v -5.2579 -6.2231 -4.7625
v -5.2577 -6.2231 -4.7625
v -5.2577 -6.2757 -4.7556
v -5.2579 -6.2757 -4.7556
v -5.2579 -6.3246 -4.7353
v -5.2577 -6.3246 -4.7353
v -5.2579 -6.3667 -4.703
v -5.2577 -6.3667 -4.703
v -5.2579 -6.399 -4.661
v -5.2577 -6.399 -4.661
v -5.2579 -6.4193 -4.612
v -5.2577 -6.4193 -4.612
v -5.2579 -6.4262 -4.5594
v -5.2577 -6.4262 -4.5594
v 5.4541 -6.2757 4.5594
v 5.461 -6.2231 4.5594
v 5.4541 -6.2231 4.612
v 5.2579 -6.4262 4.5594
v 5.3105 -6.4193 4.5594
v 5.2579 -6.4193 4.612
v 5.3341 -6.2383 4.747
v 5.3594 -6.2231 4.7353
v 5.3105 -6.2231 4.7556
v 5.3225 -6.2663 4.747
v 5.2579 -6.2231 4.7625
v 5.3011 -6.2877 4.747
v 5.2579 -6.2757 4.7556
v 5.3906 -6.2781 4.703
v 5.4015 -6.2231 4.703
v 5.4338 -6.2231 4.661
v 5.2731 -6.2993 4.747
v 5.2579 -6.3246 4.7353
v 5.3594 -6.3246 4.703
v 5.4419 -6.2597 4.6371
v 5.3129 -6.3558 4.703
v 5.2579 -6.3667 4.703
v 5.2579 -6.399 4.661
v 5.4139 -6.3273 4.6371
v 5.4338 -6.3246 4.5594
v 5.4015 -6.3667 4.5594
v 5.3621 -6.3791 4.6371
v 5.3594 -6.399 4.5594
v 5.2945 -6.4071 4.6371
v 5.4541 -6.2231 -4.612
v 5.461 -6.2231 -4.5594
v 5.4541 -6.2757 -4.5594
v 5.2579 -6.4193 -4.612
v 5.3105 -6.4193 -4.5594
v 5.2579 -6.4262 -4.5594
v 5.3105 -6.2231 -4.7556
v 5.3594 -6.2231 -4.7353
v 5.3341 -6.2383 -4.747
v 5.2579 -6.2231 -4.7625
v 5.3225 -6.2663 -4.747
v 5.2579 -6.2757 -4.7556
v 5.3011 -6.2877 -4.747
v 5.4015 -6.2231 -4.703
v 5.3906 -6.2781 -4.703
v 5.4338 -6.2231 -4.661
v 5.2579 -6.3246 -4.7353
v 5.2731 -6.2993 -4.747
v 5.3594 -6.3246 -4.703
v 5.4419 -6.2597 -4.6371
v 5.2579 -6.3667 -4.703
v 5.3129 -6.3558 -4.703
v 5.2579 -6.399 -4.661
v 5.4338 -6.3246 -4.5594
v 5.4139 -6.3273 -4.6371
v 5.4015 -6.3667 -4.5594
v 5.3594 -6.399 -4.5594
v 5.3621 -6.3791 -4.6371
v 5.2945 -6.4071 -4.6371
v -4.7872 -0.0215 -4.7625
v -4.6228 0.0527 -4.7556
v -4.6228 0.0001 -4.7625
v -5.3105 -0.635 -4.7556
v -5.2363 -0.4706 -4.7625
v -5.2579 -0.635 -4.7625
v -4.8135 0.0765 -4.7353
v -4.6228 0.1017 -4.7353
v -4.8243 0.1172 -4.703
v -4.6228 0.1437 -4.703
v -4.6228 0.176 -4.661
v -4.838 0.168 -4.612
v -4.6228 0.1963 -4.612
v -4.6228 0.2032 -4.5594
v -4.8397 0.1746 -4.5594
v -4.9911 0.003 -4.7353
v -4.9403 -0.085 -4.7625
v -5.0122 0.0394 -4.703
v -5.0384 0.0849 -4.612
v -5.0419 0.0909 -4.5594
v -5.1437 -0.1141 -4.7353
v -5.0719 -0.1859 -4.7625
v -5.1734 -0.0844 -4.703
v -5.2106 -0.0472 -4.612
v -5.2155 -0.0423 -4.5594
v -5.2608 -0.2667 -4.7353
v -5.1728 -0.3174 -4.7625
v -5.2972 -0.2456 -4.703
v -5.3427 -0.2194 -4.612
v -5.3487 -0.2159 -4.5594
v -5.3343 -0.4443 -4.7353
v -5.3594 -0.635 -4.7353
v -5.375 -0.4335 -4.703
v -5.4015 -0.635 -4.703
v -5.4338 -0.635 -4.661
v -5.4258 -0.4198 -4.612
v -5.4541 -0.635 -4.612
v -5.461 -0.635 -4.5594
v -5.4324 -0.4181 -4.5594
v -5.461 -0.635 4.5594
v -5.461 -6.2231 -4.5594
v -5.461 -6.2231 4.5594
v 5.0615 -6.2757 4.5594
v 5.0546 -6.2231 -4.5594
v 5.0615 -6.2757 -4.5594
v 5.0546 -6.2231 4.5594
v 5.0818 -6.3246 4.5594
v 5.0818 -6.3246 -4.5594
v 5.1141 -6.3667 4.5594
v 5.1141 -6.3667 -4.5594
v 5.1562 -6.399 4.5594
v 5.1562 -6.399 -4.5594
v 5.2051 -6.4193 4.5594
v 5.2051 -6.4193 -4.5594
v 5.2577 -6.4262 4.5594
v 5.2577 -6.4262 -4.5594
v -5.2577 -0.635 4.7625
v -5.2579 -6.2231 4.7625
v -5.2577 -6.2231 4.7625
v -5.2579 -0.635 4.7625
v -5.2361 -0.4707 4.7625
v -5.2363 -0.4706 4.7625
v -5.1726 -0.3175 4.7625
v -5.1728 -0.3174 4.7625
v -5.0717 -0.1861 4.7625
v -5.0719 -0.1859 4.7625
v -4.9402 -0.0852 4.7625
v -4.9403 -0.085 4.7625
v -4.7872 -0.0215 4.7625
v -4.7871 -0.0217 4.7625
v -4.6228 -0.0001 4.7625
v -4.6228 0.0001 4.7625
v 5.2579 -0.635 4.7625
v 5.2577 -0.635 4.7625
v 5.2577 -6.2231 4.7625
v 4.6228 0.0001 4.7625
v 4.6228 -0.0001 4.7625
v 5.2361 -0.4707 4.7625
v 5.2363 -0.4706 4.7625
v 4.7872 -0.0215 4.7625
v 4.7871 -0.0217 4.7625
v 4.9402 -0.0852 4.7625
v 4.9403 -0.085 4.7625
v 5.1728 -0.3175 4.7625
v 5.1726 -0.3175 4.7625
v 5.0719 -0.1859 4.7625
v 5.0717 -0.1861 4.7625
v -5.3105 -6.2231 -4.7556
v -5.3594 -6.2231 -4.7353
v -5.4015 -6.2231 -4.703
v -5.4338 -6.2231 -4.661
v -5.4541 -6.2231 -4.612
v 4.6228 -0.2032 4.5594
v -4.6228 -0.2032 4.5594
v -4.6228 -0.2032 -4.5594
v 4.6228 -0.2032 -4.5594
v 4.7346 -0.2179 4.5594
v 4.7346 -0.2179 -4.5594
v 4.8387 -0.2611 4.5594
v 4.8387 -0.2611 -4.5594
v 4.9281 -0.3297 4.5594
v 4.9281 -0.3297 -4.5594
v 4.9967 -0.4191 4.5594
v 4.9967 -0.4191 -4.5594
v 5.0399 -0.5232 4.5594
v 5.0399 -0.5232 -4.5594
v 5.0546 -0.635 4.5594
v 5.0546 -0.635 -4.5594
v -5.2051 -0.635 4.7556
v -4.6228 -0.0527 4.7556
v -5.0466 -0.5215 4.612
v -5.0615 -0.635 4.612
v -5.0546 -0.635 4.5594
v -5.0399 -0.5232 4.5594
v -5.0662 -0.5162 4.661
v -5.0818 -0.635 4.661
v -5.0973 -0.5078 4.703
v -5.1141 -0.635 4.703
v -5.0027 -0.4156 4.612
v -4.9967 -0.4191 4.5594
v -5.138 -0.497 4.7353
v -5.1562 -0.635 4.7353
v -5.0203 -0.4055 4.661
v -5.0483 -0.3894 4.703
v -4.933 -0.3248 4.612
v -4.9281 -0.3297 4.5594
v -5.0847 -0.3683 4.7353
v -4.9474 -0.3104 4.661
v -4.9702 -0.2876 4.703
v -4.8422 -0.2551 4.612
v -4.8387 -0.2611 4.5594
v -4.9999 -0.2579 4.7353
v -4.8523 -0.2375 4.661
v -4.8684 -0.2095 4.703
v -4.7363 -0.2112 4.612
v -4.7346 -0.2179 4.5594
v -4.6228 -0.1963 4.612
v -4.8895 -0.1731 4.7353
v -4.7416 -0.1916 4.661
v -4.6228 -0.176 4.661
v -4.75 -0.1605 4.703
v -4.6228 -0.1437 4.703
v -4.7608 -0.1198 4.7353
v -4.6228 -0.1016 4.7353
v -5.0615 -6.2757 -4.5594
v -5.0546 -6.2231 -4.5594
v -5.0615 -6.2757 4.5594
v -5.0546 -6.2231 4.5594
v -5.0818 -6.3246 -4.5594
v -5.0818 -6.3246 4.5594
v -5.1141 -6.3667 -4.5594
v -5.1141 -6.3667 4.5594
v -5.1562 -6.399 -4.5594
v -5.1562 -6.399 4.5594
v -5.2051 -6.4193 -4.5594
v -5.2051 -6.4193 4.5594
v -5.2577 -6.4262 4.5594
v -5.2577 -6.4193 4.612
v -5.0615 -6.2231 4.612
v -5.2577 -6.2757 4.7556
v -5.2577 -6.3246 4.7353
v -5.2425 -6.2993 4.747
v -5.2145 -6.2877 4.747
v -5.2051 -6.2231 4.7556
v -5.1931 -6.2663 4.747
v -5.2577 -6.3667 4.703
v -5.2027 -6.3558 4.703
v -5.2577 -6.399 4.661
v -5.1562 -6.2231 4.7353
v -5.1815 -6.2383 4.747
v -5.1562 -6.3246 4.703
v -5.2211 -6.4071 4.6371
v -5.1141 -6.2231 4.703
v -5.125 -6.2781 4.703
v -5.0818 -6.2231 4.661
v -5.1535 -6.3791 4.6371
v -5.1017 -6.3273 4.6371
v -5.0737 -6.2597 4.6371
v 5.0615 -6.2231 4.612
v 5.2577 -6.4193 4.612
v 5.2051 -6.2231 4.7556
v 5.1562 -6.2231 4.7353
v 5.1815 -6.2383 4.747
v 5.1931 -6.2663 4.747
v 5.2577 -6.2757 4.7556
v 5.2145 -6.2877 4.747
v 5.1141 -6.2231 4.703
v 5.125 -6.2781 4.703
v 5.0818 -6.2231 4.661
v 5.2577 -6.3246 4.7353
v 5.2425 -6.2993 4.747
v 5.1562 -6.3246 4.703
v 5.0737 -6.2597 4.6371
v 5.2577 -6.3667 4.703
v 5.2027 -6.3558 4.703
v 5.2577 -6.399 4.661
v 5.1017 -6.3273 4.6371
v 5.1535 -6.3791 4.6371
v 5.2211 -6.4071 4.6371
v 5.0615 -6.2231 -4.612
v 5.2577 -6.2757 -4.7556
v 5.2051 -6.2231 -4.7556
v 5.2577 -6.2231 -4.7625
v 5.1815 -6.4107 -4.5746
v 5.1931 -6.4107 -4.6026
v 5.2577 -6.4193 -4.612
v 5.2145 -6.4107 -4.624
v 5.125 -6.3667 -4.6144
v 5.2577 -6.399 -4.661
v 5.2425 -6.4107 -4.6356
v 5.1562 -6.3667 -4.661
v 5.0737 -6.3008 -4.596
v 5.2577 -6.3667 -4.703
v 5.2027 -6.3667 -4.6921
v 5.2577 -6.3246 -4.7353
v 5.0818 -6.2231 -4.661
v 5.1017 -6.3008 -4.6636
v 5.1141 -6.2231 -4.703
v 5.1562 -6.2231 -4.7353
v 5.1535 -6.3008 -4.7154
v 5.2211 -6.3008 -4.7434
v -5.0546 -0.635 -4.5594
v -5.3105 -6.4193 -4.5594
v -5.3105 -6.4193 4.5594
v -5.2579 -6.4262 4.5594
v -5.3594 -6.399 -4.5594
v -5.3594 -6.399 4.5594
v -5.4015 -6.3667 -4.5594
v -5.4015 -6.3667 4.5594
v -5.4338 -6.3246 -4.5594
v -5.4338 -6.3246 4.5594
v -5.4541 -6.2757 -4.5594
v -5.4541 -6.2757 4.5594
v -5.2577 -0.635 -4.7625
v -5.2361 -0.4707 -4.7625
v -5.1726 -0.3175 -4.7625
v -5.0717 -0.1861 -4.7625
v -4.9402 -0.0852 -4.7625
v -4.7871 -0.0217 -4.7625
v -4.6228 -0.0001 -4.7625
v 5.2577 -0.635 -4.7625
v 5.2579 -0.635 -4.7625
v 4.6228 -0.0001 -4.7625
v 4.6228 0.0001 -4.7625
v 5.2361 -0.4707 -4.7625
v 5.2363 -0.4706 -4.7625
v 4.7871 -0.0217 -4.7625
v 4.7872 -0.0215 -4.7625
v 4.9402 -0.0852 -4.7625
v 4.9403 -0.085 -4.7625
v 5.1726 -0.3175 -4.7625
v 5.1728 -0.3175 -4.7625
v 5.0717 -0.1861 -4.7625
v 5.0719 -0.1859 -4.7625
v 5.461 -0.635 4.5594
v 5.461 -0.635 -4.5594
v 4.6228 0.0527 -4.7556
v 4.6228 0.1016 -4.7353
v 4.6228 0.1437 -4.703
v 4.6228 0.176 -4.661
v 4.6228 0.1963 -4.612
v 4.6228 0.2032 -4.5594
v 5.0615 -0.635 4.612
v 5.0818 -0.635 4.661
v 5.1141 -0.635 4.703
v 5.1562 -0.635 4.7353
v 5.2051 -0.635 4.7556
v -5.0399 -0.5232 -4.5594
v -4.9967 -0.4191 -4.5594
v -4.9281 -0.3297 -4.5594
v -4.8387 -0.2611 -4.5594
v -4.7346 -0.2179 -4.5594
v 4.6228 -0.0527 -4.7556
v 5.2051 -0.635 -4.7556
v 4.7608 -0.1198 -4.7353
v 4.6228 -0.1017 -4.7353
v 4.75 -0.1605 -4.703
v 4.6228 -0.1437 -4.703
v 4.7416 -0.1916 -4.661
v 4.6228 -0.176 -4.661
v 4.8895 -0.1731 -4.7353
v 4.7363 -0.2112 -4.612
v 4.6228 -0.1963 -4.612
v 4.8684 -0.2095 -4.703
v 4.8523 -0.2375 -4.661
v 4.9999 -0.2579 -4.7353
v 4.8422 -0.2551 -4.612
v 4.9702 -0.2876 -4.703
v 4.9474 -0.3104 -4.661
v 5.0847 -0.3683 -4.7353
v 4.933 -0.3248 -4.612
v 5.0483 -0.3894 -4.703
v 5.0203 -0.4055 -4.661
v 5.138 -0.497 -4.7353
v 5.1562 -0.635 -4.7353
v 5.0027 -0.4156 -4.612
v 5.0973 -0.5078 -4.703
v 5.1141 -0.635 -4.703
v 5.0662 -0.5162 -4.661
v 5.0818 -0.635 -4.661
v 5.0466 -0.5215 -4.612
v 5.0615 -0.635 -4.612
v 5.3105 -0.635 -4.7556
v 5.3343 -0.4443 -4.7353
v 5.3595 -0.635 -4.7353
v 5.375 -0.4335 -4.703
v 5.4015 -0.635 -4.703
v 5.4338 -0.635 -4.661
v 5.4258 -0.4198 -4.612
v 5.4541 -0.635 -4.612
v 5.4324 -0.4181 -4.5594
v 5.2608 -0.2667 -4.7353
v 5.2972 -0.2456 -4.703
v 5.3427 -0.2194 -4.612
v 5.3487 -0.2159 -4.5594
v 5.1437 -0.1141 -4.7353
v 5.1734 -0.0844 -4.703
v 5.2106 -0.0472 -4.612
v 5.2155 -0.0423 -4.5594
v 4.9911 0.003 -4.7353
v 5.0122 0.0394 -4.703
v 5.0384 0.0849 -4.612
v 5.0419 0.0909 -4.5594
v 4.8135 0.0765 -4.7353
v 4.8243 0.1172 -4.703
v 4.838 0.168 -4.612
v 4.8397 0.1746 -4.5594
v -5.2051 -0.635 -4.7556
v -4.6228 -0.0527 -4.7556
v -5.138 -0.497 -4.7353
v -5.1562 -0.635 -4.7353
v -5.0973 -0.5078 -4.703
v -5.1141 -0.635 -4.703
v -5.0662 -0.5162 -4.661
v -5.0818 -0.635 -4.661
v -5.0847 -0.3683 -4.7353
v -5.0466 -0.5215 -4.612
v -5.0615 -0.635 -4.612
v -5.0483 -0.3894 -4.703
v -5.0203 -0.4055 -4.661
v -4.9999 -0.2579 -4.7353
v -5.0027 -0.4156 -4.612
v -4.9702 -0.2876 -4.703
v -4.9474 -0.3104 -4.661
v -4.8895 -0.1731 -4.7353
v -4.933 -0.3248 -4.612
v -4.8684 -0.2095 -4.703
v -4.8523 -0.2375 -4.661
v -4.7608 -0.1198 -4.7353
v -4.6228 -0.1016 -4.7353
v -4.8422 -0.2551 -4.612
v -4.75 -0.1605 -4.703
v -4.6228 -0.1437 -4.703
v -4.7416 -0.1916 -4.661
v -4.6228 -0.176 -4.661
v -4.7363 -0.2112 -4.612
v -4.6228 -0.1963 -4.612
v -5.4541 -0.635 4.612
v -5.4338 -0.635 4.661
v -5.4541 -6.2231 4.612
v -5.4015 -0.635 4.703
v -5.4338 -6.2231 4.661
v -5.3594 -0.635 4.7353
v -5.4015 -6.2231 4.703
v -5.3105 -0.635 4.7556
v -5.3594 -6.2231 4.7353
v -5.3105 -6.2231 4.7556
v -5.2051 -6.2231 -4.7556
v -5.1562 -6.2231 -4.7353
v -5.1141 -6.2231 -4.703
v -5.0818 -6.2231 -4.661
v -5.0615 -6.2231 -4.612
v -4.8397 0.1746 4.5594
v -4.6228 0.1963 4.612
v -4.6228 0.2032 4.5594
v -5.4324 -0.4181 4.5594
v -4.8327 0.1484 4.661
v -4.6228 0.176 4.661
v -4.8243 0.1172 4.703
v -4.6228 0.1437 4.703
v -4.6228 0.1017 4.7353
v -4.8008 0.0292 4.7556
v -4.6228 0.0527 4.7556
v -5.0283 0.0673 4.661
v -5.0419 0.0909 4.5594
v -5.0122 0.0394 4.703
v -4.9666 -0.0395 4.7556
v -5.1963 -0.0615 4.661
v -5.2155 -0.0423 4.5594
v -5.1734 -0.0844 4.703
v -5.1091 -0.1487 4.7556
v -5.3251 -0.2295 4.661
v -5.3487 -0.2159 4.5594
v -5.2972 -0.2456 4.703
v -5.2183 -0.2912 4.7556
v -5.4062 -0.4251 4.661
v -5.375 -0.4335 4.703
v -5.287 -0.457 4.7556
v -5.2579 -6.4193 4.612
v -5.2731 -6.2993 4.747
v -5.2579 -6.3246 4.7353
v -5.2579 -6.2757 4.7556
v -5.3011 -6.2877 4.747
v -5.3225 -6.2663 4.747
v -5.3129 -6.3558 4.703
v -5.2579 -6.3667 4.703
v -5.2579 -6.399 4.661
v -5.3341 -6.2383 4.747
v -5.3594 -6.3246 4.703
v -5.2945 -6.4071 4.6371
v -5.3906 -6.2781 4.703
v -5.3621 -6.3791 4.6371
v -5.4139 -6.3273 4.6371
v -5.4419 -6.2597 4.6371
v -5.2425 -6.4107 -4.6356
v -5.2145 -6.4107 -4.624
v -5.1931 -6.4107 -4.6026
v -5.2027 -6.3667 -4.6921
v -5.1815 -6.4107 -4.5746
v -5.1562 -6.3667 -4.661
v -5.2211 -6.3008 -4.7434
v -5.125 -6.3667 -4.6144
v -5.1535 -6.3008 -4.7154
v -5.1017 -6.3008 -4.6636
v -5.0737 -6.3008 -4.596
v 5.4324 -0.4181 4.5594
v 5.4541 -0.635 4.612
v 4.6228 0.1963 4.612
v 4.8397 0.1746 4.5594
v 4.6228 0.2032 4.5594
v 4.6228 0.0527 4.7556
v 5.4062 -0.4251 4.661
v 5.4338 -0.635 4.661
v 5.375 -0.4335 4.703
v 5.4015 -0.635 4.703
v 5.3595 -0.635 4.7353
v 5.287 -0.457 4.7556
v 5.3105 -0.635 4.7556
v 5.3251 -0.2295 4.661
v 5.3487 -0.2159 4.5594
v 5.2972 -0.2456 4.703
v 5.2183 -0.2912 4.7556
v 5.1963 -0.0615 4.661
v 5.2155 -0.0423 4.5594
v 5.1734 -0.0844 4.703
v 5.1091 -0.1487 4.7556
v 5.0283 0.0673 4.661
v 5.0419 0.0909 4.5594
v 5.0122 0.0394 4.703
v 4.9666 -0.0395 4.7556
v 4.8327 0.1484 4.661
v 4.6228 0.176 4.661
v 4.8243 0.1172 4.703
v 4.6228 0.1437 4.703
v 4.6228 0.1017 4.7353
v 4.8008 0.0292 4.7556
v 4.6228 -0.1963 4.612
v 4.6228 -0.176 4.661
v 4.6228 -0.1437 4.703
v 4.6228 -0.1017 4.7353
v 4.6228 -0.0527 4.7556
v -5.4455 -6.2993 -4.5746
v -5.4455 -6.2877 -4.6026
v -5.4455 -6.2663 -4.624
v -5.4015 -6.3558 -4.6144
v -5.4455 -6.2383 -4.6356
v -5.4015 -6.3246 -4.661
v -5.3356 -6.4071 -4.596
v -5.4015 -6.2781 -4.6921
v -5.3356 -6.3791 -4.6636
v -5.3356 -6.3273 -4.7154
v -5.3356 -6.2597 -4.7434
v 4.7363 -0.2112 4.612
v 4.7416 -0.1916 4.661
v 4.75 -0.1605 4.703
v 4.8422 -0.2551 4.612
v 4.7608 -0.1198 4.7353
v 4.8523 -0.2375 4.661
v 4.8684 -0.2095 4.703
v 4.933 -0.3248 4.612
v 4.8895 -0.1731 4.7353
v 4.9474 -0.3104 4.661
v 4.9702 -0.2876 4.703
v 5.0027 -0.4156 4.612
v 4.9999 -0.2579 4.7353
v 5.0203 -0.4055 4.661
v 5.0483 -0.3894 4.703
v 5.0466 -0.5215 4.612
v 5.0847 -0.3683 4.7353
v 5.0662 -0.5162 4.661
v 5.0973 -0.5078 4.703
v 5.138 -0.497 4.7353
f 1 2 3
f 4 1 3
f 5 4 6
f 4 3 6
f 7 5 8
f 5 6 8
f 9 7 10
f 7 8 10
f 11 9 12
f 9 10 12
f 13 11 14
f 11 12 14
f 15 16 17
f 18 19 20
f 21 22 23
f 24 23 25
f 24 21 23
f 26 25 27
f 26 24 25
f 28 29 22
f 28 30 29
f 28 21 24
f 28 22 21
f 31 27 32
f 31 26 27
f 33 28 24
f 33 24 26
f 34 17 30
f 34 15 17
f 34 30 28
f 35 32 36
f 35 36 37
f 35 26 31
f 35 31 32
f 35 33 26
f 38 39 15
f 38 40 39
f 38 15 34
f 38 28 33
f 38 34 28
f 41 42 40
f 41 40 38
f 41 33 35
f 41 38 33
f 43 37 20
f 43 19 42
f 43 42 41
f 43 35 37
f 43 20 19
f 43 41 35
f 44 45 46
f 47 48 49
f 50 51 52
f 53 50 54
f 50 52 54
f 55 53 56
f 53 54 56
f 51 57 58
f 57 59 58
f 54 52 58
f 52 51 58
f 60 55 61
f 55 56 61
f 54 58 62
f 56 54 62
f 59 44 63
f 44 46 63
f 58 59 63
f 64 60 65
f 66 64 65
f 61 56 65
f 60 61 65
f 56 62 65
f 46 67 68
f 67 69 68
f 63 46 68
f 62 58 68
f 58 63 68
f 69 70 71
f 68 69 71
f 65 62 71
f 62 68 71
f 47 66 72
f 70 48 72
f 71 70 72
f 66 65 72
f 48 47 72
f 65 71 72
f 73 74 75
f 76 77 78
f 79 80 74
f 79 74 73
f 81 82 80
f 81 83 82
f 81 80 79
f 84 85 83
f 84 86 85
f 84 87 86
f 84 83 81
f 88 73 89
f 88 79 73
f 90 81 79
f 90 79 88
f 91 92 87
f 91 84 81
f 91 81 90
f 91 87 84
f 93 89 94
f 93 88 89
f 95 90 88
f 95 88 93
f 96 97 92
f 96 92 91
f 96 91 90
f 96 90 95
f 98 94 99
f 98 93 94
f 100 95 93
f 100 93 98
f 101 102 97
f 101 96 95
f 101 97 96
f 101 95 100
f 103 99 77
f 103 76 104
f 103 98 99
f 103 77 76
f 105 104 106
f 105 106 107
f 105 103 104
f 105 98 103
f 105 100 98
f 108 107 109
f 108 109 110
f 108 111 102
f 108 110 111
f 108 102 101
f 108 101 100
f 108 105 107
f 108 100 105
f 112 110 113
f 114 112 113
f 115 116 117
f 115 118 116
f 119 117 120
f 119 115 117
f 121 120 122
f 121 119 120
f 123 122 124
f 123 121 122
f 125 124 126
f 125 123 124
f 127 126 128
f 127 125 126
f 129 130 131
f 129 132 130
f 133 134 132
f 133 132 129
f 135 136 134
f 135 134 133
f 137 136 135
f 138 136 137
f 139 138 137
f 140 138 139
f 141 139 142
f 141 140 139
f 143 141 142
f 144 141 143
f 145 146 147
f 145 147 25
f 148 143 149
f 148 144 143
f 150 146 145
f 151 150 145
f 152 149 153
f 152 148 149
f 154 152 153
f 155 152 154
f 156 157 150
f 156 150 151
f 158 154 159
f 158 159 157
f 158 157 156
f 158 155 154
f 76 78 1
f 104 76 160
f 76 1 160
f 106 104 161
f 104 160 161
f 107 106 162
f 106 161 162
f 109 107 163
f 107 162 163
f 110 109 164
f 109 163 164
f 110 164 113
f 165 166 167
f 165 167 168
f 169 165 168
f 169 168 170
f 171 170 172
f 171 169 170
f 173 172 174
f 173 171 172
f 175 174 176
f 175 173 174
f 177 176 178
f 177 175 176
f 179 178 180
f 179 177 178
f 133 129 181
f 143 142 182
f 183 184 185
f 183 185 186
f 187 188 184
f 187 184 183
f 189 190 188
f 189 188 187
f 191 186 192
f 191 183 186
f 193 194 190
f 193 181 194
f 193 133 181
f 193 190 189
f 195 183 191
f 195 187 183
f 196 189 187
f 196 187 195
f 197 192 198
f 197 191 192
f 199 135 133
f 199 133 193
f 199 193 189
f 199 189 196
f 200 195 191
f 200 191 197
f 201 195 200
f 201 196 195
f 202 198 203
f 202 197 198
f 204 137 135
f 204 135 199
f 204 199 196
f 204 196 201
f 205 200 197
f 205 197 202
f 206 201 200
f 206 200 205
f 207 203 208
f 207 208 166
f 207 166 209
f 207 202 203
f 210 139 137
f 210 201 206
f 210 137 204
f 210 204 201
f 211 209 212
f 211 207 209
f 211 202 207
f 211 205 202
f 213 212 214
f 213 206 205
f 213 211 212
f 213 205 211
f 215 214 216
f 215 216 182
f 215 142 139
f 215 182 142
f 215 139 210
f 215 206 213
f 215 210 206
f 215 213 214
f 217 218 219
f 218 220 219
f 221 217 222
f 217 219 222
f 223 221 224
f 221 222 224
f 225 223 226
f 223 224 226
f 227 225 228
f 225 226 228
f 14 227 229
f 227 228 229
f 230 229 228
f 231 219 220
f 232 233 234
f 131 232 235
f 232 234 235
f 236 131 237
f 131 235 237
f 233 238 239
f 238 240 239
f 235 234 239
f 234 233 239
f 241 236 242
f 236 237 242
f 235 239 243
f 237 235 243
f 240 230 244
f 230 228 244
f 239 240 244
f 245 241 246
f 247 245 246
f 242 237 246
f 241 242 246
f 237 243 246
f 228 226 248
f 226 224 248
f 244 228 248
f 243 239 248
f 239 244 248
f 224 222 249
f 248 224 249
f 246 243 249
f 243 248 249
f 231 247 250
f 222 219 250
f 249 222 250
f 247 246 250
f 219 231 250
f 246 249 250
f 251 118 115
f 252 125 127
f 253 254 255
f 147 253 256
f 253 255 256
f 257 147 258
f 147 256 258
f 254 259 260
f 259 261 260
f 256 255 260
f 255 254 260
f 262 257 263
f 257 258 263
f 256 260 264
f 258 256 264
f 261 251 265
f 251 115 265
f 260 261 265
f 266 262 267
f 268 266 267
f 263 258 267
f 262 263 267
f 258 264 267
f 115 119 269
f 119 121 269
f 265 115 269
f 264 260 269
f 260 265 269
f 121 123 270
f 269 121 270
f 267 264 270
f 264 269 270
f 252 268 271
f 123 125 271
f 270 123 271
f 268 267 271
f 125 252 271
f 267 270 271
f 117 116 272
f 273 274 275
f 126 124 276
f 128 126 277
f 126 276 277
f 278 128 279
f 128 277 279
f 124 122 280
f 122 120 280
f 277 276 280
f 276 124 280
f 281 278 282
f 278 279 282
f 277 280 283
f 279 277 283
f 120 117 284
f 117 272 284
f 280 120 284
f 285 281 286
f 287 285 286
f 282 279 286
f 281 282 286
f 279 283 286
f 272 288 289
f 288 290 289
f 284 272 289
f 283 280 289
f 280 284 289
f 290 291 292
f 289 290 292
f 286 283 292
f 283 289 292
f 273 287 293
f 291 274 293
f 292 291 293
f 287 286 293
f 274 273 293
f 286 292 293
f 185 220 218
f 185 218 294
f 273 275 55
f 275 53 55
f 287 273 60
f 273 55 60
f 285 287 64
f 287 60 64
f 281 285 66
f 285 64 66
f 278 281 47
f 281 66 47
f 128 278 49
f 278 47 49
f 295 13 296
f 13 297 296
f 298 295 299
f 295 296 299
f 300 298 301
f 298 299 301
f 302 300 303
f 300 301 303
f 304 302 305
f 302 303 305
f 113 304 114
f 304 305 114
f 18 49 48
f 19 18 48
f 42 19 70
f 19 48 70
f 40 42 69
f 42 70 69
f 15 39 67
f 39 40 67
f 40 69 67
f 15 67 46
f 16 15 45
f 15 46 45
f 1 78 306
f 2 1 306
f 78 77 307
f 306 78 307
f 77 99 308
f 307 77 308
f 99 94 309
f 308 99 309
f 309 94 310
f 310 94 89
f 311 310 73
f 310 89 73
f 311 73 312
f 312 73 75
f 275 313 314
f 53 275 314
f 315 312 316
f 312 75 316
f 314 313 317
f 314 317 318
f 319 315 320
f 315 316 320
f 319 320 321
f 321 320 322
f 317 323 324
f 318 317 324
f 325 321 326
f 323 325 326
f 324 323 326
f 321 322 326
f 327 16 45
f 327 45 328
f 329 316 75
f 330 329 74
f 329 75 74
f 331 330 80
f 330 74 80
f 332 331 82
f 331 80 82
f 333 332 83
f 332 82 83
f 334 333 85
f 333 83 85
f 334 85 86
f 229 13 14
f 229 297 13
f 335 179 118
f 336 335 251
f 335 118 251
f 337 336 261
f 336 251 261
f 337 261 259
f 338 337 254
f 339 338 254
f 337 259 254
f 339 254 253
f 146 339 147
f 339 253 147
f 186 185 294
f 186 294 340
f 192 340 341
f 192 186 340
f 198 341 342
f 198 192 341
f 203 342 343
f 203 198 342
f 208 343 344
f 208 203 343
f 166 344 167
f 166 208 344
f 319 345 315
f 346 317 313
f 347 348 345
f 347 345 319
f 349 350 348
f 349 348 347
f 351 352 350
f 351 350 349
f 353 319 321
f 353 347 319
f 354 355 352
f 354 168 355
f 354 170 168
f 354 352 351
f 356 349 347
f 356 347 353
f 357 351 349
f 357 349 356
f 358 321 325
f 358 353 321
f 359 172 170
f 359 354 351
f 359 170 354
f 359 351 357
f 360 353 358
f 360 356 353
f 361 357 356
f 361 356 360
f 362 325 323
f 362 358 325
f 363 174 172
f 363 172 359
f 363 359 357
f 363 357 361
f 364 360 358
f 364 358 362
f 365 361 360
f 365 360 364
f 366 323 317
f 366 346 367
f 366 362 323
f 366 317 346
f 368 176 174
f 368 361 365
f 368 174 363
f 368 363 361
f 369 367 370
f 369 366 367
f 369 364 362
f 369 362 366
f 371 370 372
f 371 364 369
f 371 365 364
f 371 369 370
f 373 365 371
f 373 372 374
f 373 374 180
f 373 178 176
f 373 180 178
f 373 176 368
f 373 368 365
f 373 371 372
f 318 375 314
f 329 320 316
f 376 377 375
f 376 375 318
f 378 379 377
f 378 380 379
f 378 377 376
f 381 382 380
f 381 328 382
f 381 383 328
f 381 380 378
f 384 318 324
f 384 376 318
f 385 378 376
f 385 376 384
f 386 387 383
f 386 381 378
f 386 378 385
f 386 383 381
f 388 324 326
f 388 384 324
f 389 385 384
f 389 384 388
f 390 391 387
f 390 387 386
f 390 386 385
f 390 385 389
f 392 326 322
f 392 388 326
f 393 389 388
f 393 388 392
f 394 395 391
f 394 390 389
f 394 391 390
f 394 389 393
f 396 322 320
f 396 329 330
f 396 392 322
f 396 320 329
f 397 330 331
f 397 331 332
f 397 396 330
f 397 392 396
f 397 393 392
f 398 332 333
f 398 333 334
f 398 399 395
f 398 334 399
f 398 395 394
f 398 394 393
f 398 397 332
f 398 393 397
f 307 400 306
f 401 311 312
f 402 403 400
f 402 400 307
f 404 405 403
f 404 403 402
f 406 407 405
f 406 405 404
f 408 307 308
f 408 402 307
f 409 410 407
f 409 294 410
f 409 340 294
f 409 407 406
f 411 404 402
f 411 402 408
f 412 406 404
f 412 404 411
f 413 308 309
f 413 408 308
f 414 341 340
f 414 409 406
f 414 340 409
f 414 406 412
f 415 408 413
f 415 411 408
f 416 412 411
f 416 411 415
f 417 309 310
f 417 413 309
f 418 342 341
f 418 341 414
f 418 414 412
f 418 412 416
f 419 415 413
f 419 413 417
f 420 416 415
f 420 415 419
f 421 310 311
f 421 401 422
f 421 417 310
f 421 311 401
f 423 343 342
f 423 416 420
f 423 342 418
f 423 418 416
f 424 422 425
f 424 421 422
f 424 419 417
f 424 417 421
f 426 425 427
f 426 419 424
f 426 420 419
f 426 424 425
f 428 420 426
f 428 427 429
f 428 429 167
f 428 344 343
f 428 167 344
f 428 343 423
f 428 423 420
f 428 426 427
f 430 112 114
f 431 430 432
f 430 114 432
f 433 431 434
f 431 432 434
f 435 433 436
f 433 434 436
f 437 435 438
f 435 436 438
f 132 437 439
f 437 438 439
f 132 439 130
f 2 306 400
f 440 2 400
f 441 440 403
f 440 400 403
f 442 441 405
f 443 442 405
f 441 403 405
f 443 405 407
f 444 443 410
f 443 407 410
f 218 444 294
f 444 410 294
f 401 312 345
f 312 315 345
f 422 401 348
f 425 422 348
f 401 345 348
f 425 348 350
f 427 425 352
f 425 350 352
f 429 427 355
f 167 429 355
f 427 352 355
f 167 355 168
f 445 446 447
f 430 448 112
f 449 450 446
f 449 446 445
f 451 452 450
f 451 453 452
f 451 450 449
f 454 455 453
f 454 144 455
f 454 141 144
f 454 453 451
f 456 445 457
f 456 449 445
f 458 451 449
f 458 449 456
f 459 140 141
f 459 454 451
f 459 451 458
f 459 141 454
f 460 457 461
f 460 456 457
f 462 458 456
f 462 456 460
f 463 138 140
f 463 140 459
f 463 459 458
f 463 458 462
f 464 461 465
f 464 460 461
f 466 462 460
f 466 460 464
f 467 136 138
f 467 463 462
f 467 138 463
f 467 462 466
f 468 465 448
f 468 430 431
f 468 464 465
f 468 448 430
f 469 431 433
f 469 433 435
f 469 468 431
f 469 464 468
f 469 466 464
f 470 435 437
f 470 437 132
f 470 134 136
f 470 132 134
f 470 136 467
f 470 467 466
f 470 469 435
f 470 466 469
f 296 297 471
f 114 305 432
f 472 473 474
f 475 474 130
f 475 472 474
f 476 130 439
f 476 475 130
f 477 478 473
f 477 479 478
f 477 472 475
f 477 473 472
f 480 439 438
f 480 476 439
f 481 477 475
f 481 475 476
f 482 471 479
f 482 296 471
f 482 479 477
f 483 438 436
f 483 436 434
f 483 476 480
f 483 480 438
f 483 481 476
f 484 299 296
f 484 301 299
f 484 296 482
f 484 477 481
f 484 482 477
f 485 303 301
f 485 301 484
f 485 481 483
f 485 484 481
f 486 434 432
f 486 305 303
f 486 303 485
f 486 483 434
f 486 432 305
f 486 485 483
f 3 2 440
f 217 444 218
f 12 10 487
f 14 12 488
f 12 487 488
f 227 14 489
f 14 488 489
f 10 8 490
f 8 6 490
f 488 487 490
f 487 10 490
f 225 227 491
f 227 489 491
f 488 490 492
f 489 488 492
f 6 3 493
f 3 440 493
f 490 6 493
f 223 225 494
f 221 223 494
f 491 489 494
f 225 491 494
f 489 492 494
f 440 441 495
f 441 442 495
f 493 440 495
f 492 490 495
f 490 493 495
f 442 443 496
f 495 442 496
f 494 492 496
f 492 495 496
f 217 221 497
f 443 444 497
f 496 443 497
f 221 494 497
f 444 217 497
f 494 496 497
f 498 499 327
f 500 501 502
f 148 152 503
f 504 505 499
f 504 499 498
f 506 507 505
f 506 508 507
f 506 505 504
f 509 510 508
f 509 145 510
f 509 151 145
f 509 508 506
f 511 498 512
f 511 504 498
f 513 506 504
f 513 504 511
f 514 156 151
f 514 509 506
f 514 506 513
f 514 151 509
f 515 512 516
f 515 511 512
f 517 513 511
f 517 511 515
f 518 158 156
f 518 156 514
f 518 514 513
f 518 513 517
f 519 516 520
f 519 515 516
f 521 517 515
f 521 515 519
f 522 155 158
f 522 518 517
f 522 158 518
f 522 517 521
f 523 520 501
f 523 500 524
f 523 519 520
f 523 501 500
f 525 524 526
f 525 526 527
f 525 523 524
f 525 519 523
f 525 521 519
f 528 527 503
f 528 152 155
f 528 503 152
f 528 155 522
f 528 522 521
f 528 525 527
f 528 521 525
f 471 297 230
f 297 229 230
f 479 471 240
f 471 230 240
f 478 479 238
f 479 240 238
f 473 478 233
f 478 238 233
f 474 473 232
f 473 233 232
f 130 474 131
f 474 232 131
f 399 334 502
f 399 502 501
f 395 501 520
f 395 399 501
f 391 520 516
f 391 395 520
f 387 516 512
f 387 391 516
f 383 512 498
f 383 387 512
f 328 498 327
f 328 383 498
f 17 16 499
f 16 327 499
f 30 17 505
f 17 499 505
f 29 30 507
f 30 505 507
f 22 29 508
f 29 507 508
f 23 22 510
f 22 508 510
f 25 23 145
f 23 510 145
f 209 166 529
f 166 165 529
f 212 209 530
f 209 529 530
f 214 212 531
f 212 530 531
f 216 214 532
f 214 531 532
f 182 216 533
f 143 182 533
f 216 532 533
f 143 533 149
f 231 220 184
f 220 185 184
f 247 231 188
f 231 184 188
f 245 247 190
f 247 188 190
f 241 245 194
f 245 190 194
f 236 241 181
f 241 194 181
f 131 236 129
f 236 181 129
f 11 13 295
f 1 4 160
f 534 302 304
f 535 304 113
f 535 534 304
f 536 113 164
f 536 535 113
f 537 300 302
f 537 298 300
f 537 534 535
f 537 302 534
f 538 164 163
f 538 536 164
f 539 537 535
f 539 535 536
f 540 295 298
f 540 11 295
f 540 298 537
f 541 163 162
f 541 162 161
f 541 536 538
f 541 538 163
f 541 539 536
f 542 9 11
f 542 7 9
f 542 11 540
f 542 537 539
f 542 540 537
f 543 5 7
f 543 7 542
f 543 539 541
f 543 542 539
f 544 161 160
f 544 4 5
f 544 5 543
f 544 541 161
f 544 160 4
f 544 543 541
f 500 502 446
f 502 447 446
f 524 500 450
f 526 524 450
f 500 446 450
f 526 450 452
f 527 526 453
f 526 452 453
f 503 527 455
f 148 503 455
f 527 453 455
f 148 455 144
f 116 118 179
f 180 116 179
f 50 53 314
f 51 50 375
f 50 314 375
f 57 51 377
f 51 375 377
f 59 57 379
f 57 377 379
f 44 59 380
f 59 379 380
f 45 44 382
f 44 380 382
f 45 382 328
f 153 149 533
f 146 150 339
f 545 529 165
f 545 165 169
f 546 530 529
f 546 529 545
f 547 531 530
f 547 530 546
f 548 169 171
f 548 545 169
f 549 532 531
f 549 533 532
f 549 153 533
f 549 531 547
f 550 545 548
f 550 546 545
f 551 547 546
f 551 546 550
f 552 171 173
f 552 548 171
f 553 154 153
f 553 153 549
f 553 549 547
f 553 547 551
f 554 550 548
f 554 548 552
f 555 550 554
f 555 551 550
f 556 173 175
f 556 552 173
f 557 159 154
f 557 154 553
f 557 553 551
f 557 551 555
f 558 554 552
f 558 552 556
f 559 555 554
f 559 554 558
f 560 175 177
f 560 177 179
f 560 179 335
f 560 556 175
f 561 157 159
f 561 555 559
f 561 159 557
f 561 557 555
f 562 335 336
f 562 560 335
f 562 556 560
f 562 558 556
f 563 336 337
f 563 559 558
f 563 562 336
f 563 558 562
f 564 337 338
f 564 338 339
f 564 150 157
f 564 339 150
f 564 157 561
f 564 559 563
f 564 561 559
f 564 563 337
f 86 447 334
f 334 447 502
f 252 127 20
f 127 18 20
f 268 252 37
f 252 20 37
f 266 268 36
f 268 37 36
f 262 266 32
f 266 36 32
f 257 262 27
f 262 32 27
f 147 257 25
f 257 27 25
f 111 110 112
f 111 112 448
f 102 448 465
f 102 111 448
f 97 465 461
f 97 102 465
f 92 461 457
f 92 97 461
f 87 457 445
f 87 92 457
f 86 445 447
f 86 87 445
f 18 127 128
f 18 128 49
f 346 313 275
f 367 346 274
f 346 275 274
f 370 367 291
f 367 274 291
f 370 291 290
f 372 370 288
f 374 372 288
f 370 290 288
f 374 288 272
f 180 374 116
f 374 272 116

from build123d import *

# Parameters (mm, degrees)
SKETCH1_W           = 10.922
SKETCH1_H           = 0.4064
SKETCH1_W_2         = 0.4064
SKETCH1_H_2         = 6.223
BOSS_EXTRUDE1_DEPTH = 4.7625
FILLET1_R           = 0.8382
FILLET2_R           = 0.4318
FILLET3_R           = 0.2032


with BuildPart() as part:
    # Sketch1 → Boss-Extrude1 (new, symmetric)
    with BuildSketch(Plane.XY):
        Rectangle(SKETCH1_W, SKETCH1_H)
        with Locations((-5.2578, -3.3147)):
            Rectangle(SKETCH1_W_2, SKETCH1_H_2)
        with Locations((5.2578, -3.3147)):
            Rectangle(SKETCH1_W_2, SKETCH1_H_2)
    extrude(amount=BOSS_EXTRUDE1_DEPTH, both=True)

    # Fillet1
    fillet1_edges = [part.edges().sort_by_distance(p)[0] for p in [
        (-5.461, 0.2032, 0),
        (5.461, 0.2032, 0),
    ]]
    fillet(fillet1_edges, radius=FILLET1_R)

    # Fillet2
    fillet2_edges = [part.edges().sort_by_distance(p)[0] for p in [
        (5.0546, -0.2032, 0),
        (-5.0546, -0.2032, 0),
    ]]
    fillet(fillet2_edges, radius=FILLET2_R)

    # Fillet3
    fillet3_edges = [part.edges().sort_by_distance(p)[0] for p in [
        (-5.0546, -3.5306, -4.7625),
        (-5.2578, -6.4262, -4.7625),
        (5.461, -6.4262, 0),
        (5.0546, -6.4262, 0),
        (-5.0546, -6.4262, 0),
        (-5.461, -6.4262, 0),
        (-5.2578, -6.4262, 4.7625),
        (-5.0546, -3.5306, 4.7625),
        (-5.461, -3.5306, -4.7625),
        (-5.461, -3.5306, 4.7625),
        (5.461, -3.5306, -4.7625),
        (0, 0.2032, -4.7625),
        (5.215496904, -0.042303096, -4.7625),
        (-5.215496904, -0.042303096, -4.7625),
        (0, 0.2032, 4.7625),
        (5.461, -3.5306, 4.7625),
        (5.215496904, -0.042303096, 4.7625),
        (5.0546, -3.5306, 4.7625),
        (-5.215496904, -0.042303096, 4.7625),
        (5.2578, -6.4262, 4.7625),
        (0, -0.2032, -4.7625),
        (0, -0.2032, 4.7625),
        (-4.928128708, -0.329671292, -4.7625),
        (-4.928128708, -0.329671292, 4.7625),
        (4.928128708, -0.329671292, -4.7625),
        (4.928128708, -0.329671292, 4.7625),
        (5.2578, -6.4262, -4.7625),
        (5.0546, -3.5306, -4.7625),
    ]]
    fillet(fillet3_edges, radius=FILLET3_R - 0.0001)  # a hair under: the kernel refuses the full size


solid = part.part
